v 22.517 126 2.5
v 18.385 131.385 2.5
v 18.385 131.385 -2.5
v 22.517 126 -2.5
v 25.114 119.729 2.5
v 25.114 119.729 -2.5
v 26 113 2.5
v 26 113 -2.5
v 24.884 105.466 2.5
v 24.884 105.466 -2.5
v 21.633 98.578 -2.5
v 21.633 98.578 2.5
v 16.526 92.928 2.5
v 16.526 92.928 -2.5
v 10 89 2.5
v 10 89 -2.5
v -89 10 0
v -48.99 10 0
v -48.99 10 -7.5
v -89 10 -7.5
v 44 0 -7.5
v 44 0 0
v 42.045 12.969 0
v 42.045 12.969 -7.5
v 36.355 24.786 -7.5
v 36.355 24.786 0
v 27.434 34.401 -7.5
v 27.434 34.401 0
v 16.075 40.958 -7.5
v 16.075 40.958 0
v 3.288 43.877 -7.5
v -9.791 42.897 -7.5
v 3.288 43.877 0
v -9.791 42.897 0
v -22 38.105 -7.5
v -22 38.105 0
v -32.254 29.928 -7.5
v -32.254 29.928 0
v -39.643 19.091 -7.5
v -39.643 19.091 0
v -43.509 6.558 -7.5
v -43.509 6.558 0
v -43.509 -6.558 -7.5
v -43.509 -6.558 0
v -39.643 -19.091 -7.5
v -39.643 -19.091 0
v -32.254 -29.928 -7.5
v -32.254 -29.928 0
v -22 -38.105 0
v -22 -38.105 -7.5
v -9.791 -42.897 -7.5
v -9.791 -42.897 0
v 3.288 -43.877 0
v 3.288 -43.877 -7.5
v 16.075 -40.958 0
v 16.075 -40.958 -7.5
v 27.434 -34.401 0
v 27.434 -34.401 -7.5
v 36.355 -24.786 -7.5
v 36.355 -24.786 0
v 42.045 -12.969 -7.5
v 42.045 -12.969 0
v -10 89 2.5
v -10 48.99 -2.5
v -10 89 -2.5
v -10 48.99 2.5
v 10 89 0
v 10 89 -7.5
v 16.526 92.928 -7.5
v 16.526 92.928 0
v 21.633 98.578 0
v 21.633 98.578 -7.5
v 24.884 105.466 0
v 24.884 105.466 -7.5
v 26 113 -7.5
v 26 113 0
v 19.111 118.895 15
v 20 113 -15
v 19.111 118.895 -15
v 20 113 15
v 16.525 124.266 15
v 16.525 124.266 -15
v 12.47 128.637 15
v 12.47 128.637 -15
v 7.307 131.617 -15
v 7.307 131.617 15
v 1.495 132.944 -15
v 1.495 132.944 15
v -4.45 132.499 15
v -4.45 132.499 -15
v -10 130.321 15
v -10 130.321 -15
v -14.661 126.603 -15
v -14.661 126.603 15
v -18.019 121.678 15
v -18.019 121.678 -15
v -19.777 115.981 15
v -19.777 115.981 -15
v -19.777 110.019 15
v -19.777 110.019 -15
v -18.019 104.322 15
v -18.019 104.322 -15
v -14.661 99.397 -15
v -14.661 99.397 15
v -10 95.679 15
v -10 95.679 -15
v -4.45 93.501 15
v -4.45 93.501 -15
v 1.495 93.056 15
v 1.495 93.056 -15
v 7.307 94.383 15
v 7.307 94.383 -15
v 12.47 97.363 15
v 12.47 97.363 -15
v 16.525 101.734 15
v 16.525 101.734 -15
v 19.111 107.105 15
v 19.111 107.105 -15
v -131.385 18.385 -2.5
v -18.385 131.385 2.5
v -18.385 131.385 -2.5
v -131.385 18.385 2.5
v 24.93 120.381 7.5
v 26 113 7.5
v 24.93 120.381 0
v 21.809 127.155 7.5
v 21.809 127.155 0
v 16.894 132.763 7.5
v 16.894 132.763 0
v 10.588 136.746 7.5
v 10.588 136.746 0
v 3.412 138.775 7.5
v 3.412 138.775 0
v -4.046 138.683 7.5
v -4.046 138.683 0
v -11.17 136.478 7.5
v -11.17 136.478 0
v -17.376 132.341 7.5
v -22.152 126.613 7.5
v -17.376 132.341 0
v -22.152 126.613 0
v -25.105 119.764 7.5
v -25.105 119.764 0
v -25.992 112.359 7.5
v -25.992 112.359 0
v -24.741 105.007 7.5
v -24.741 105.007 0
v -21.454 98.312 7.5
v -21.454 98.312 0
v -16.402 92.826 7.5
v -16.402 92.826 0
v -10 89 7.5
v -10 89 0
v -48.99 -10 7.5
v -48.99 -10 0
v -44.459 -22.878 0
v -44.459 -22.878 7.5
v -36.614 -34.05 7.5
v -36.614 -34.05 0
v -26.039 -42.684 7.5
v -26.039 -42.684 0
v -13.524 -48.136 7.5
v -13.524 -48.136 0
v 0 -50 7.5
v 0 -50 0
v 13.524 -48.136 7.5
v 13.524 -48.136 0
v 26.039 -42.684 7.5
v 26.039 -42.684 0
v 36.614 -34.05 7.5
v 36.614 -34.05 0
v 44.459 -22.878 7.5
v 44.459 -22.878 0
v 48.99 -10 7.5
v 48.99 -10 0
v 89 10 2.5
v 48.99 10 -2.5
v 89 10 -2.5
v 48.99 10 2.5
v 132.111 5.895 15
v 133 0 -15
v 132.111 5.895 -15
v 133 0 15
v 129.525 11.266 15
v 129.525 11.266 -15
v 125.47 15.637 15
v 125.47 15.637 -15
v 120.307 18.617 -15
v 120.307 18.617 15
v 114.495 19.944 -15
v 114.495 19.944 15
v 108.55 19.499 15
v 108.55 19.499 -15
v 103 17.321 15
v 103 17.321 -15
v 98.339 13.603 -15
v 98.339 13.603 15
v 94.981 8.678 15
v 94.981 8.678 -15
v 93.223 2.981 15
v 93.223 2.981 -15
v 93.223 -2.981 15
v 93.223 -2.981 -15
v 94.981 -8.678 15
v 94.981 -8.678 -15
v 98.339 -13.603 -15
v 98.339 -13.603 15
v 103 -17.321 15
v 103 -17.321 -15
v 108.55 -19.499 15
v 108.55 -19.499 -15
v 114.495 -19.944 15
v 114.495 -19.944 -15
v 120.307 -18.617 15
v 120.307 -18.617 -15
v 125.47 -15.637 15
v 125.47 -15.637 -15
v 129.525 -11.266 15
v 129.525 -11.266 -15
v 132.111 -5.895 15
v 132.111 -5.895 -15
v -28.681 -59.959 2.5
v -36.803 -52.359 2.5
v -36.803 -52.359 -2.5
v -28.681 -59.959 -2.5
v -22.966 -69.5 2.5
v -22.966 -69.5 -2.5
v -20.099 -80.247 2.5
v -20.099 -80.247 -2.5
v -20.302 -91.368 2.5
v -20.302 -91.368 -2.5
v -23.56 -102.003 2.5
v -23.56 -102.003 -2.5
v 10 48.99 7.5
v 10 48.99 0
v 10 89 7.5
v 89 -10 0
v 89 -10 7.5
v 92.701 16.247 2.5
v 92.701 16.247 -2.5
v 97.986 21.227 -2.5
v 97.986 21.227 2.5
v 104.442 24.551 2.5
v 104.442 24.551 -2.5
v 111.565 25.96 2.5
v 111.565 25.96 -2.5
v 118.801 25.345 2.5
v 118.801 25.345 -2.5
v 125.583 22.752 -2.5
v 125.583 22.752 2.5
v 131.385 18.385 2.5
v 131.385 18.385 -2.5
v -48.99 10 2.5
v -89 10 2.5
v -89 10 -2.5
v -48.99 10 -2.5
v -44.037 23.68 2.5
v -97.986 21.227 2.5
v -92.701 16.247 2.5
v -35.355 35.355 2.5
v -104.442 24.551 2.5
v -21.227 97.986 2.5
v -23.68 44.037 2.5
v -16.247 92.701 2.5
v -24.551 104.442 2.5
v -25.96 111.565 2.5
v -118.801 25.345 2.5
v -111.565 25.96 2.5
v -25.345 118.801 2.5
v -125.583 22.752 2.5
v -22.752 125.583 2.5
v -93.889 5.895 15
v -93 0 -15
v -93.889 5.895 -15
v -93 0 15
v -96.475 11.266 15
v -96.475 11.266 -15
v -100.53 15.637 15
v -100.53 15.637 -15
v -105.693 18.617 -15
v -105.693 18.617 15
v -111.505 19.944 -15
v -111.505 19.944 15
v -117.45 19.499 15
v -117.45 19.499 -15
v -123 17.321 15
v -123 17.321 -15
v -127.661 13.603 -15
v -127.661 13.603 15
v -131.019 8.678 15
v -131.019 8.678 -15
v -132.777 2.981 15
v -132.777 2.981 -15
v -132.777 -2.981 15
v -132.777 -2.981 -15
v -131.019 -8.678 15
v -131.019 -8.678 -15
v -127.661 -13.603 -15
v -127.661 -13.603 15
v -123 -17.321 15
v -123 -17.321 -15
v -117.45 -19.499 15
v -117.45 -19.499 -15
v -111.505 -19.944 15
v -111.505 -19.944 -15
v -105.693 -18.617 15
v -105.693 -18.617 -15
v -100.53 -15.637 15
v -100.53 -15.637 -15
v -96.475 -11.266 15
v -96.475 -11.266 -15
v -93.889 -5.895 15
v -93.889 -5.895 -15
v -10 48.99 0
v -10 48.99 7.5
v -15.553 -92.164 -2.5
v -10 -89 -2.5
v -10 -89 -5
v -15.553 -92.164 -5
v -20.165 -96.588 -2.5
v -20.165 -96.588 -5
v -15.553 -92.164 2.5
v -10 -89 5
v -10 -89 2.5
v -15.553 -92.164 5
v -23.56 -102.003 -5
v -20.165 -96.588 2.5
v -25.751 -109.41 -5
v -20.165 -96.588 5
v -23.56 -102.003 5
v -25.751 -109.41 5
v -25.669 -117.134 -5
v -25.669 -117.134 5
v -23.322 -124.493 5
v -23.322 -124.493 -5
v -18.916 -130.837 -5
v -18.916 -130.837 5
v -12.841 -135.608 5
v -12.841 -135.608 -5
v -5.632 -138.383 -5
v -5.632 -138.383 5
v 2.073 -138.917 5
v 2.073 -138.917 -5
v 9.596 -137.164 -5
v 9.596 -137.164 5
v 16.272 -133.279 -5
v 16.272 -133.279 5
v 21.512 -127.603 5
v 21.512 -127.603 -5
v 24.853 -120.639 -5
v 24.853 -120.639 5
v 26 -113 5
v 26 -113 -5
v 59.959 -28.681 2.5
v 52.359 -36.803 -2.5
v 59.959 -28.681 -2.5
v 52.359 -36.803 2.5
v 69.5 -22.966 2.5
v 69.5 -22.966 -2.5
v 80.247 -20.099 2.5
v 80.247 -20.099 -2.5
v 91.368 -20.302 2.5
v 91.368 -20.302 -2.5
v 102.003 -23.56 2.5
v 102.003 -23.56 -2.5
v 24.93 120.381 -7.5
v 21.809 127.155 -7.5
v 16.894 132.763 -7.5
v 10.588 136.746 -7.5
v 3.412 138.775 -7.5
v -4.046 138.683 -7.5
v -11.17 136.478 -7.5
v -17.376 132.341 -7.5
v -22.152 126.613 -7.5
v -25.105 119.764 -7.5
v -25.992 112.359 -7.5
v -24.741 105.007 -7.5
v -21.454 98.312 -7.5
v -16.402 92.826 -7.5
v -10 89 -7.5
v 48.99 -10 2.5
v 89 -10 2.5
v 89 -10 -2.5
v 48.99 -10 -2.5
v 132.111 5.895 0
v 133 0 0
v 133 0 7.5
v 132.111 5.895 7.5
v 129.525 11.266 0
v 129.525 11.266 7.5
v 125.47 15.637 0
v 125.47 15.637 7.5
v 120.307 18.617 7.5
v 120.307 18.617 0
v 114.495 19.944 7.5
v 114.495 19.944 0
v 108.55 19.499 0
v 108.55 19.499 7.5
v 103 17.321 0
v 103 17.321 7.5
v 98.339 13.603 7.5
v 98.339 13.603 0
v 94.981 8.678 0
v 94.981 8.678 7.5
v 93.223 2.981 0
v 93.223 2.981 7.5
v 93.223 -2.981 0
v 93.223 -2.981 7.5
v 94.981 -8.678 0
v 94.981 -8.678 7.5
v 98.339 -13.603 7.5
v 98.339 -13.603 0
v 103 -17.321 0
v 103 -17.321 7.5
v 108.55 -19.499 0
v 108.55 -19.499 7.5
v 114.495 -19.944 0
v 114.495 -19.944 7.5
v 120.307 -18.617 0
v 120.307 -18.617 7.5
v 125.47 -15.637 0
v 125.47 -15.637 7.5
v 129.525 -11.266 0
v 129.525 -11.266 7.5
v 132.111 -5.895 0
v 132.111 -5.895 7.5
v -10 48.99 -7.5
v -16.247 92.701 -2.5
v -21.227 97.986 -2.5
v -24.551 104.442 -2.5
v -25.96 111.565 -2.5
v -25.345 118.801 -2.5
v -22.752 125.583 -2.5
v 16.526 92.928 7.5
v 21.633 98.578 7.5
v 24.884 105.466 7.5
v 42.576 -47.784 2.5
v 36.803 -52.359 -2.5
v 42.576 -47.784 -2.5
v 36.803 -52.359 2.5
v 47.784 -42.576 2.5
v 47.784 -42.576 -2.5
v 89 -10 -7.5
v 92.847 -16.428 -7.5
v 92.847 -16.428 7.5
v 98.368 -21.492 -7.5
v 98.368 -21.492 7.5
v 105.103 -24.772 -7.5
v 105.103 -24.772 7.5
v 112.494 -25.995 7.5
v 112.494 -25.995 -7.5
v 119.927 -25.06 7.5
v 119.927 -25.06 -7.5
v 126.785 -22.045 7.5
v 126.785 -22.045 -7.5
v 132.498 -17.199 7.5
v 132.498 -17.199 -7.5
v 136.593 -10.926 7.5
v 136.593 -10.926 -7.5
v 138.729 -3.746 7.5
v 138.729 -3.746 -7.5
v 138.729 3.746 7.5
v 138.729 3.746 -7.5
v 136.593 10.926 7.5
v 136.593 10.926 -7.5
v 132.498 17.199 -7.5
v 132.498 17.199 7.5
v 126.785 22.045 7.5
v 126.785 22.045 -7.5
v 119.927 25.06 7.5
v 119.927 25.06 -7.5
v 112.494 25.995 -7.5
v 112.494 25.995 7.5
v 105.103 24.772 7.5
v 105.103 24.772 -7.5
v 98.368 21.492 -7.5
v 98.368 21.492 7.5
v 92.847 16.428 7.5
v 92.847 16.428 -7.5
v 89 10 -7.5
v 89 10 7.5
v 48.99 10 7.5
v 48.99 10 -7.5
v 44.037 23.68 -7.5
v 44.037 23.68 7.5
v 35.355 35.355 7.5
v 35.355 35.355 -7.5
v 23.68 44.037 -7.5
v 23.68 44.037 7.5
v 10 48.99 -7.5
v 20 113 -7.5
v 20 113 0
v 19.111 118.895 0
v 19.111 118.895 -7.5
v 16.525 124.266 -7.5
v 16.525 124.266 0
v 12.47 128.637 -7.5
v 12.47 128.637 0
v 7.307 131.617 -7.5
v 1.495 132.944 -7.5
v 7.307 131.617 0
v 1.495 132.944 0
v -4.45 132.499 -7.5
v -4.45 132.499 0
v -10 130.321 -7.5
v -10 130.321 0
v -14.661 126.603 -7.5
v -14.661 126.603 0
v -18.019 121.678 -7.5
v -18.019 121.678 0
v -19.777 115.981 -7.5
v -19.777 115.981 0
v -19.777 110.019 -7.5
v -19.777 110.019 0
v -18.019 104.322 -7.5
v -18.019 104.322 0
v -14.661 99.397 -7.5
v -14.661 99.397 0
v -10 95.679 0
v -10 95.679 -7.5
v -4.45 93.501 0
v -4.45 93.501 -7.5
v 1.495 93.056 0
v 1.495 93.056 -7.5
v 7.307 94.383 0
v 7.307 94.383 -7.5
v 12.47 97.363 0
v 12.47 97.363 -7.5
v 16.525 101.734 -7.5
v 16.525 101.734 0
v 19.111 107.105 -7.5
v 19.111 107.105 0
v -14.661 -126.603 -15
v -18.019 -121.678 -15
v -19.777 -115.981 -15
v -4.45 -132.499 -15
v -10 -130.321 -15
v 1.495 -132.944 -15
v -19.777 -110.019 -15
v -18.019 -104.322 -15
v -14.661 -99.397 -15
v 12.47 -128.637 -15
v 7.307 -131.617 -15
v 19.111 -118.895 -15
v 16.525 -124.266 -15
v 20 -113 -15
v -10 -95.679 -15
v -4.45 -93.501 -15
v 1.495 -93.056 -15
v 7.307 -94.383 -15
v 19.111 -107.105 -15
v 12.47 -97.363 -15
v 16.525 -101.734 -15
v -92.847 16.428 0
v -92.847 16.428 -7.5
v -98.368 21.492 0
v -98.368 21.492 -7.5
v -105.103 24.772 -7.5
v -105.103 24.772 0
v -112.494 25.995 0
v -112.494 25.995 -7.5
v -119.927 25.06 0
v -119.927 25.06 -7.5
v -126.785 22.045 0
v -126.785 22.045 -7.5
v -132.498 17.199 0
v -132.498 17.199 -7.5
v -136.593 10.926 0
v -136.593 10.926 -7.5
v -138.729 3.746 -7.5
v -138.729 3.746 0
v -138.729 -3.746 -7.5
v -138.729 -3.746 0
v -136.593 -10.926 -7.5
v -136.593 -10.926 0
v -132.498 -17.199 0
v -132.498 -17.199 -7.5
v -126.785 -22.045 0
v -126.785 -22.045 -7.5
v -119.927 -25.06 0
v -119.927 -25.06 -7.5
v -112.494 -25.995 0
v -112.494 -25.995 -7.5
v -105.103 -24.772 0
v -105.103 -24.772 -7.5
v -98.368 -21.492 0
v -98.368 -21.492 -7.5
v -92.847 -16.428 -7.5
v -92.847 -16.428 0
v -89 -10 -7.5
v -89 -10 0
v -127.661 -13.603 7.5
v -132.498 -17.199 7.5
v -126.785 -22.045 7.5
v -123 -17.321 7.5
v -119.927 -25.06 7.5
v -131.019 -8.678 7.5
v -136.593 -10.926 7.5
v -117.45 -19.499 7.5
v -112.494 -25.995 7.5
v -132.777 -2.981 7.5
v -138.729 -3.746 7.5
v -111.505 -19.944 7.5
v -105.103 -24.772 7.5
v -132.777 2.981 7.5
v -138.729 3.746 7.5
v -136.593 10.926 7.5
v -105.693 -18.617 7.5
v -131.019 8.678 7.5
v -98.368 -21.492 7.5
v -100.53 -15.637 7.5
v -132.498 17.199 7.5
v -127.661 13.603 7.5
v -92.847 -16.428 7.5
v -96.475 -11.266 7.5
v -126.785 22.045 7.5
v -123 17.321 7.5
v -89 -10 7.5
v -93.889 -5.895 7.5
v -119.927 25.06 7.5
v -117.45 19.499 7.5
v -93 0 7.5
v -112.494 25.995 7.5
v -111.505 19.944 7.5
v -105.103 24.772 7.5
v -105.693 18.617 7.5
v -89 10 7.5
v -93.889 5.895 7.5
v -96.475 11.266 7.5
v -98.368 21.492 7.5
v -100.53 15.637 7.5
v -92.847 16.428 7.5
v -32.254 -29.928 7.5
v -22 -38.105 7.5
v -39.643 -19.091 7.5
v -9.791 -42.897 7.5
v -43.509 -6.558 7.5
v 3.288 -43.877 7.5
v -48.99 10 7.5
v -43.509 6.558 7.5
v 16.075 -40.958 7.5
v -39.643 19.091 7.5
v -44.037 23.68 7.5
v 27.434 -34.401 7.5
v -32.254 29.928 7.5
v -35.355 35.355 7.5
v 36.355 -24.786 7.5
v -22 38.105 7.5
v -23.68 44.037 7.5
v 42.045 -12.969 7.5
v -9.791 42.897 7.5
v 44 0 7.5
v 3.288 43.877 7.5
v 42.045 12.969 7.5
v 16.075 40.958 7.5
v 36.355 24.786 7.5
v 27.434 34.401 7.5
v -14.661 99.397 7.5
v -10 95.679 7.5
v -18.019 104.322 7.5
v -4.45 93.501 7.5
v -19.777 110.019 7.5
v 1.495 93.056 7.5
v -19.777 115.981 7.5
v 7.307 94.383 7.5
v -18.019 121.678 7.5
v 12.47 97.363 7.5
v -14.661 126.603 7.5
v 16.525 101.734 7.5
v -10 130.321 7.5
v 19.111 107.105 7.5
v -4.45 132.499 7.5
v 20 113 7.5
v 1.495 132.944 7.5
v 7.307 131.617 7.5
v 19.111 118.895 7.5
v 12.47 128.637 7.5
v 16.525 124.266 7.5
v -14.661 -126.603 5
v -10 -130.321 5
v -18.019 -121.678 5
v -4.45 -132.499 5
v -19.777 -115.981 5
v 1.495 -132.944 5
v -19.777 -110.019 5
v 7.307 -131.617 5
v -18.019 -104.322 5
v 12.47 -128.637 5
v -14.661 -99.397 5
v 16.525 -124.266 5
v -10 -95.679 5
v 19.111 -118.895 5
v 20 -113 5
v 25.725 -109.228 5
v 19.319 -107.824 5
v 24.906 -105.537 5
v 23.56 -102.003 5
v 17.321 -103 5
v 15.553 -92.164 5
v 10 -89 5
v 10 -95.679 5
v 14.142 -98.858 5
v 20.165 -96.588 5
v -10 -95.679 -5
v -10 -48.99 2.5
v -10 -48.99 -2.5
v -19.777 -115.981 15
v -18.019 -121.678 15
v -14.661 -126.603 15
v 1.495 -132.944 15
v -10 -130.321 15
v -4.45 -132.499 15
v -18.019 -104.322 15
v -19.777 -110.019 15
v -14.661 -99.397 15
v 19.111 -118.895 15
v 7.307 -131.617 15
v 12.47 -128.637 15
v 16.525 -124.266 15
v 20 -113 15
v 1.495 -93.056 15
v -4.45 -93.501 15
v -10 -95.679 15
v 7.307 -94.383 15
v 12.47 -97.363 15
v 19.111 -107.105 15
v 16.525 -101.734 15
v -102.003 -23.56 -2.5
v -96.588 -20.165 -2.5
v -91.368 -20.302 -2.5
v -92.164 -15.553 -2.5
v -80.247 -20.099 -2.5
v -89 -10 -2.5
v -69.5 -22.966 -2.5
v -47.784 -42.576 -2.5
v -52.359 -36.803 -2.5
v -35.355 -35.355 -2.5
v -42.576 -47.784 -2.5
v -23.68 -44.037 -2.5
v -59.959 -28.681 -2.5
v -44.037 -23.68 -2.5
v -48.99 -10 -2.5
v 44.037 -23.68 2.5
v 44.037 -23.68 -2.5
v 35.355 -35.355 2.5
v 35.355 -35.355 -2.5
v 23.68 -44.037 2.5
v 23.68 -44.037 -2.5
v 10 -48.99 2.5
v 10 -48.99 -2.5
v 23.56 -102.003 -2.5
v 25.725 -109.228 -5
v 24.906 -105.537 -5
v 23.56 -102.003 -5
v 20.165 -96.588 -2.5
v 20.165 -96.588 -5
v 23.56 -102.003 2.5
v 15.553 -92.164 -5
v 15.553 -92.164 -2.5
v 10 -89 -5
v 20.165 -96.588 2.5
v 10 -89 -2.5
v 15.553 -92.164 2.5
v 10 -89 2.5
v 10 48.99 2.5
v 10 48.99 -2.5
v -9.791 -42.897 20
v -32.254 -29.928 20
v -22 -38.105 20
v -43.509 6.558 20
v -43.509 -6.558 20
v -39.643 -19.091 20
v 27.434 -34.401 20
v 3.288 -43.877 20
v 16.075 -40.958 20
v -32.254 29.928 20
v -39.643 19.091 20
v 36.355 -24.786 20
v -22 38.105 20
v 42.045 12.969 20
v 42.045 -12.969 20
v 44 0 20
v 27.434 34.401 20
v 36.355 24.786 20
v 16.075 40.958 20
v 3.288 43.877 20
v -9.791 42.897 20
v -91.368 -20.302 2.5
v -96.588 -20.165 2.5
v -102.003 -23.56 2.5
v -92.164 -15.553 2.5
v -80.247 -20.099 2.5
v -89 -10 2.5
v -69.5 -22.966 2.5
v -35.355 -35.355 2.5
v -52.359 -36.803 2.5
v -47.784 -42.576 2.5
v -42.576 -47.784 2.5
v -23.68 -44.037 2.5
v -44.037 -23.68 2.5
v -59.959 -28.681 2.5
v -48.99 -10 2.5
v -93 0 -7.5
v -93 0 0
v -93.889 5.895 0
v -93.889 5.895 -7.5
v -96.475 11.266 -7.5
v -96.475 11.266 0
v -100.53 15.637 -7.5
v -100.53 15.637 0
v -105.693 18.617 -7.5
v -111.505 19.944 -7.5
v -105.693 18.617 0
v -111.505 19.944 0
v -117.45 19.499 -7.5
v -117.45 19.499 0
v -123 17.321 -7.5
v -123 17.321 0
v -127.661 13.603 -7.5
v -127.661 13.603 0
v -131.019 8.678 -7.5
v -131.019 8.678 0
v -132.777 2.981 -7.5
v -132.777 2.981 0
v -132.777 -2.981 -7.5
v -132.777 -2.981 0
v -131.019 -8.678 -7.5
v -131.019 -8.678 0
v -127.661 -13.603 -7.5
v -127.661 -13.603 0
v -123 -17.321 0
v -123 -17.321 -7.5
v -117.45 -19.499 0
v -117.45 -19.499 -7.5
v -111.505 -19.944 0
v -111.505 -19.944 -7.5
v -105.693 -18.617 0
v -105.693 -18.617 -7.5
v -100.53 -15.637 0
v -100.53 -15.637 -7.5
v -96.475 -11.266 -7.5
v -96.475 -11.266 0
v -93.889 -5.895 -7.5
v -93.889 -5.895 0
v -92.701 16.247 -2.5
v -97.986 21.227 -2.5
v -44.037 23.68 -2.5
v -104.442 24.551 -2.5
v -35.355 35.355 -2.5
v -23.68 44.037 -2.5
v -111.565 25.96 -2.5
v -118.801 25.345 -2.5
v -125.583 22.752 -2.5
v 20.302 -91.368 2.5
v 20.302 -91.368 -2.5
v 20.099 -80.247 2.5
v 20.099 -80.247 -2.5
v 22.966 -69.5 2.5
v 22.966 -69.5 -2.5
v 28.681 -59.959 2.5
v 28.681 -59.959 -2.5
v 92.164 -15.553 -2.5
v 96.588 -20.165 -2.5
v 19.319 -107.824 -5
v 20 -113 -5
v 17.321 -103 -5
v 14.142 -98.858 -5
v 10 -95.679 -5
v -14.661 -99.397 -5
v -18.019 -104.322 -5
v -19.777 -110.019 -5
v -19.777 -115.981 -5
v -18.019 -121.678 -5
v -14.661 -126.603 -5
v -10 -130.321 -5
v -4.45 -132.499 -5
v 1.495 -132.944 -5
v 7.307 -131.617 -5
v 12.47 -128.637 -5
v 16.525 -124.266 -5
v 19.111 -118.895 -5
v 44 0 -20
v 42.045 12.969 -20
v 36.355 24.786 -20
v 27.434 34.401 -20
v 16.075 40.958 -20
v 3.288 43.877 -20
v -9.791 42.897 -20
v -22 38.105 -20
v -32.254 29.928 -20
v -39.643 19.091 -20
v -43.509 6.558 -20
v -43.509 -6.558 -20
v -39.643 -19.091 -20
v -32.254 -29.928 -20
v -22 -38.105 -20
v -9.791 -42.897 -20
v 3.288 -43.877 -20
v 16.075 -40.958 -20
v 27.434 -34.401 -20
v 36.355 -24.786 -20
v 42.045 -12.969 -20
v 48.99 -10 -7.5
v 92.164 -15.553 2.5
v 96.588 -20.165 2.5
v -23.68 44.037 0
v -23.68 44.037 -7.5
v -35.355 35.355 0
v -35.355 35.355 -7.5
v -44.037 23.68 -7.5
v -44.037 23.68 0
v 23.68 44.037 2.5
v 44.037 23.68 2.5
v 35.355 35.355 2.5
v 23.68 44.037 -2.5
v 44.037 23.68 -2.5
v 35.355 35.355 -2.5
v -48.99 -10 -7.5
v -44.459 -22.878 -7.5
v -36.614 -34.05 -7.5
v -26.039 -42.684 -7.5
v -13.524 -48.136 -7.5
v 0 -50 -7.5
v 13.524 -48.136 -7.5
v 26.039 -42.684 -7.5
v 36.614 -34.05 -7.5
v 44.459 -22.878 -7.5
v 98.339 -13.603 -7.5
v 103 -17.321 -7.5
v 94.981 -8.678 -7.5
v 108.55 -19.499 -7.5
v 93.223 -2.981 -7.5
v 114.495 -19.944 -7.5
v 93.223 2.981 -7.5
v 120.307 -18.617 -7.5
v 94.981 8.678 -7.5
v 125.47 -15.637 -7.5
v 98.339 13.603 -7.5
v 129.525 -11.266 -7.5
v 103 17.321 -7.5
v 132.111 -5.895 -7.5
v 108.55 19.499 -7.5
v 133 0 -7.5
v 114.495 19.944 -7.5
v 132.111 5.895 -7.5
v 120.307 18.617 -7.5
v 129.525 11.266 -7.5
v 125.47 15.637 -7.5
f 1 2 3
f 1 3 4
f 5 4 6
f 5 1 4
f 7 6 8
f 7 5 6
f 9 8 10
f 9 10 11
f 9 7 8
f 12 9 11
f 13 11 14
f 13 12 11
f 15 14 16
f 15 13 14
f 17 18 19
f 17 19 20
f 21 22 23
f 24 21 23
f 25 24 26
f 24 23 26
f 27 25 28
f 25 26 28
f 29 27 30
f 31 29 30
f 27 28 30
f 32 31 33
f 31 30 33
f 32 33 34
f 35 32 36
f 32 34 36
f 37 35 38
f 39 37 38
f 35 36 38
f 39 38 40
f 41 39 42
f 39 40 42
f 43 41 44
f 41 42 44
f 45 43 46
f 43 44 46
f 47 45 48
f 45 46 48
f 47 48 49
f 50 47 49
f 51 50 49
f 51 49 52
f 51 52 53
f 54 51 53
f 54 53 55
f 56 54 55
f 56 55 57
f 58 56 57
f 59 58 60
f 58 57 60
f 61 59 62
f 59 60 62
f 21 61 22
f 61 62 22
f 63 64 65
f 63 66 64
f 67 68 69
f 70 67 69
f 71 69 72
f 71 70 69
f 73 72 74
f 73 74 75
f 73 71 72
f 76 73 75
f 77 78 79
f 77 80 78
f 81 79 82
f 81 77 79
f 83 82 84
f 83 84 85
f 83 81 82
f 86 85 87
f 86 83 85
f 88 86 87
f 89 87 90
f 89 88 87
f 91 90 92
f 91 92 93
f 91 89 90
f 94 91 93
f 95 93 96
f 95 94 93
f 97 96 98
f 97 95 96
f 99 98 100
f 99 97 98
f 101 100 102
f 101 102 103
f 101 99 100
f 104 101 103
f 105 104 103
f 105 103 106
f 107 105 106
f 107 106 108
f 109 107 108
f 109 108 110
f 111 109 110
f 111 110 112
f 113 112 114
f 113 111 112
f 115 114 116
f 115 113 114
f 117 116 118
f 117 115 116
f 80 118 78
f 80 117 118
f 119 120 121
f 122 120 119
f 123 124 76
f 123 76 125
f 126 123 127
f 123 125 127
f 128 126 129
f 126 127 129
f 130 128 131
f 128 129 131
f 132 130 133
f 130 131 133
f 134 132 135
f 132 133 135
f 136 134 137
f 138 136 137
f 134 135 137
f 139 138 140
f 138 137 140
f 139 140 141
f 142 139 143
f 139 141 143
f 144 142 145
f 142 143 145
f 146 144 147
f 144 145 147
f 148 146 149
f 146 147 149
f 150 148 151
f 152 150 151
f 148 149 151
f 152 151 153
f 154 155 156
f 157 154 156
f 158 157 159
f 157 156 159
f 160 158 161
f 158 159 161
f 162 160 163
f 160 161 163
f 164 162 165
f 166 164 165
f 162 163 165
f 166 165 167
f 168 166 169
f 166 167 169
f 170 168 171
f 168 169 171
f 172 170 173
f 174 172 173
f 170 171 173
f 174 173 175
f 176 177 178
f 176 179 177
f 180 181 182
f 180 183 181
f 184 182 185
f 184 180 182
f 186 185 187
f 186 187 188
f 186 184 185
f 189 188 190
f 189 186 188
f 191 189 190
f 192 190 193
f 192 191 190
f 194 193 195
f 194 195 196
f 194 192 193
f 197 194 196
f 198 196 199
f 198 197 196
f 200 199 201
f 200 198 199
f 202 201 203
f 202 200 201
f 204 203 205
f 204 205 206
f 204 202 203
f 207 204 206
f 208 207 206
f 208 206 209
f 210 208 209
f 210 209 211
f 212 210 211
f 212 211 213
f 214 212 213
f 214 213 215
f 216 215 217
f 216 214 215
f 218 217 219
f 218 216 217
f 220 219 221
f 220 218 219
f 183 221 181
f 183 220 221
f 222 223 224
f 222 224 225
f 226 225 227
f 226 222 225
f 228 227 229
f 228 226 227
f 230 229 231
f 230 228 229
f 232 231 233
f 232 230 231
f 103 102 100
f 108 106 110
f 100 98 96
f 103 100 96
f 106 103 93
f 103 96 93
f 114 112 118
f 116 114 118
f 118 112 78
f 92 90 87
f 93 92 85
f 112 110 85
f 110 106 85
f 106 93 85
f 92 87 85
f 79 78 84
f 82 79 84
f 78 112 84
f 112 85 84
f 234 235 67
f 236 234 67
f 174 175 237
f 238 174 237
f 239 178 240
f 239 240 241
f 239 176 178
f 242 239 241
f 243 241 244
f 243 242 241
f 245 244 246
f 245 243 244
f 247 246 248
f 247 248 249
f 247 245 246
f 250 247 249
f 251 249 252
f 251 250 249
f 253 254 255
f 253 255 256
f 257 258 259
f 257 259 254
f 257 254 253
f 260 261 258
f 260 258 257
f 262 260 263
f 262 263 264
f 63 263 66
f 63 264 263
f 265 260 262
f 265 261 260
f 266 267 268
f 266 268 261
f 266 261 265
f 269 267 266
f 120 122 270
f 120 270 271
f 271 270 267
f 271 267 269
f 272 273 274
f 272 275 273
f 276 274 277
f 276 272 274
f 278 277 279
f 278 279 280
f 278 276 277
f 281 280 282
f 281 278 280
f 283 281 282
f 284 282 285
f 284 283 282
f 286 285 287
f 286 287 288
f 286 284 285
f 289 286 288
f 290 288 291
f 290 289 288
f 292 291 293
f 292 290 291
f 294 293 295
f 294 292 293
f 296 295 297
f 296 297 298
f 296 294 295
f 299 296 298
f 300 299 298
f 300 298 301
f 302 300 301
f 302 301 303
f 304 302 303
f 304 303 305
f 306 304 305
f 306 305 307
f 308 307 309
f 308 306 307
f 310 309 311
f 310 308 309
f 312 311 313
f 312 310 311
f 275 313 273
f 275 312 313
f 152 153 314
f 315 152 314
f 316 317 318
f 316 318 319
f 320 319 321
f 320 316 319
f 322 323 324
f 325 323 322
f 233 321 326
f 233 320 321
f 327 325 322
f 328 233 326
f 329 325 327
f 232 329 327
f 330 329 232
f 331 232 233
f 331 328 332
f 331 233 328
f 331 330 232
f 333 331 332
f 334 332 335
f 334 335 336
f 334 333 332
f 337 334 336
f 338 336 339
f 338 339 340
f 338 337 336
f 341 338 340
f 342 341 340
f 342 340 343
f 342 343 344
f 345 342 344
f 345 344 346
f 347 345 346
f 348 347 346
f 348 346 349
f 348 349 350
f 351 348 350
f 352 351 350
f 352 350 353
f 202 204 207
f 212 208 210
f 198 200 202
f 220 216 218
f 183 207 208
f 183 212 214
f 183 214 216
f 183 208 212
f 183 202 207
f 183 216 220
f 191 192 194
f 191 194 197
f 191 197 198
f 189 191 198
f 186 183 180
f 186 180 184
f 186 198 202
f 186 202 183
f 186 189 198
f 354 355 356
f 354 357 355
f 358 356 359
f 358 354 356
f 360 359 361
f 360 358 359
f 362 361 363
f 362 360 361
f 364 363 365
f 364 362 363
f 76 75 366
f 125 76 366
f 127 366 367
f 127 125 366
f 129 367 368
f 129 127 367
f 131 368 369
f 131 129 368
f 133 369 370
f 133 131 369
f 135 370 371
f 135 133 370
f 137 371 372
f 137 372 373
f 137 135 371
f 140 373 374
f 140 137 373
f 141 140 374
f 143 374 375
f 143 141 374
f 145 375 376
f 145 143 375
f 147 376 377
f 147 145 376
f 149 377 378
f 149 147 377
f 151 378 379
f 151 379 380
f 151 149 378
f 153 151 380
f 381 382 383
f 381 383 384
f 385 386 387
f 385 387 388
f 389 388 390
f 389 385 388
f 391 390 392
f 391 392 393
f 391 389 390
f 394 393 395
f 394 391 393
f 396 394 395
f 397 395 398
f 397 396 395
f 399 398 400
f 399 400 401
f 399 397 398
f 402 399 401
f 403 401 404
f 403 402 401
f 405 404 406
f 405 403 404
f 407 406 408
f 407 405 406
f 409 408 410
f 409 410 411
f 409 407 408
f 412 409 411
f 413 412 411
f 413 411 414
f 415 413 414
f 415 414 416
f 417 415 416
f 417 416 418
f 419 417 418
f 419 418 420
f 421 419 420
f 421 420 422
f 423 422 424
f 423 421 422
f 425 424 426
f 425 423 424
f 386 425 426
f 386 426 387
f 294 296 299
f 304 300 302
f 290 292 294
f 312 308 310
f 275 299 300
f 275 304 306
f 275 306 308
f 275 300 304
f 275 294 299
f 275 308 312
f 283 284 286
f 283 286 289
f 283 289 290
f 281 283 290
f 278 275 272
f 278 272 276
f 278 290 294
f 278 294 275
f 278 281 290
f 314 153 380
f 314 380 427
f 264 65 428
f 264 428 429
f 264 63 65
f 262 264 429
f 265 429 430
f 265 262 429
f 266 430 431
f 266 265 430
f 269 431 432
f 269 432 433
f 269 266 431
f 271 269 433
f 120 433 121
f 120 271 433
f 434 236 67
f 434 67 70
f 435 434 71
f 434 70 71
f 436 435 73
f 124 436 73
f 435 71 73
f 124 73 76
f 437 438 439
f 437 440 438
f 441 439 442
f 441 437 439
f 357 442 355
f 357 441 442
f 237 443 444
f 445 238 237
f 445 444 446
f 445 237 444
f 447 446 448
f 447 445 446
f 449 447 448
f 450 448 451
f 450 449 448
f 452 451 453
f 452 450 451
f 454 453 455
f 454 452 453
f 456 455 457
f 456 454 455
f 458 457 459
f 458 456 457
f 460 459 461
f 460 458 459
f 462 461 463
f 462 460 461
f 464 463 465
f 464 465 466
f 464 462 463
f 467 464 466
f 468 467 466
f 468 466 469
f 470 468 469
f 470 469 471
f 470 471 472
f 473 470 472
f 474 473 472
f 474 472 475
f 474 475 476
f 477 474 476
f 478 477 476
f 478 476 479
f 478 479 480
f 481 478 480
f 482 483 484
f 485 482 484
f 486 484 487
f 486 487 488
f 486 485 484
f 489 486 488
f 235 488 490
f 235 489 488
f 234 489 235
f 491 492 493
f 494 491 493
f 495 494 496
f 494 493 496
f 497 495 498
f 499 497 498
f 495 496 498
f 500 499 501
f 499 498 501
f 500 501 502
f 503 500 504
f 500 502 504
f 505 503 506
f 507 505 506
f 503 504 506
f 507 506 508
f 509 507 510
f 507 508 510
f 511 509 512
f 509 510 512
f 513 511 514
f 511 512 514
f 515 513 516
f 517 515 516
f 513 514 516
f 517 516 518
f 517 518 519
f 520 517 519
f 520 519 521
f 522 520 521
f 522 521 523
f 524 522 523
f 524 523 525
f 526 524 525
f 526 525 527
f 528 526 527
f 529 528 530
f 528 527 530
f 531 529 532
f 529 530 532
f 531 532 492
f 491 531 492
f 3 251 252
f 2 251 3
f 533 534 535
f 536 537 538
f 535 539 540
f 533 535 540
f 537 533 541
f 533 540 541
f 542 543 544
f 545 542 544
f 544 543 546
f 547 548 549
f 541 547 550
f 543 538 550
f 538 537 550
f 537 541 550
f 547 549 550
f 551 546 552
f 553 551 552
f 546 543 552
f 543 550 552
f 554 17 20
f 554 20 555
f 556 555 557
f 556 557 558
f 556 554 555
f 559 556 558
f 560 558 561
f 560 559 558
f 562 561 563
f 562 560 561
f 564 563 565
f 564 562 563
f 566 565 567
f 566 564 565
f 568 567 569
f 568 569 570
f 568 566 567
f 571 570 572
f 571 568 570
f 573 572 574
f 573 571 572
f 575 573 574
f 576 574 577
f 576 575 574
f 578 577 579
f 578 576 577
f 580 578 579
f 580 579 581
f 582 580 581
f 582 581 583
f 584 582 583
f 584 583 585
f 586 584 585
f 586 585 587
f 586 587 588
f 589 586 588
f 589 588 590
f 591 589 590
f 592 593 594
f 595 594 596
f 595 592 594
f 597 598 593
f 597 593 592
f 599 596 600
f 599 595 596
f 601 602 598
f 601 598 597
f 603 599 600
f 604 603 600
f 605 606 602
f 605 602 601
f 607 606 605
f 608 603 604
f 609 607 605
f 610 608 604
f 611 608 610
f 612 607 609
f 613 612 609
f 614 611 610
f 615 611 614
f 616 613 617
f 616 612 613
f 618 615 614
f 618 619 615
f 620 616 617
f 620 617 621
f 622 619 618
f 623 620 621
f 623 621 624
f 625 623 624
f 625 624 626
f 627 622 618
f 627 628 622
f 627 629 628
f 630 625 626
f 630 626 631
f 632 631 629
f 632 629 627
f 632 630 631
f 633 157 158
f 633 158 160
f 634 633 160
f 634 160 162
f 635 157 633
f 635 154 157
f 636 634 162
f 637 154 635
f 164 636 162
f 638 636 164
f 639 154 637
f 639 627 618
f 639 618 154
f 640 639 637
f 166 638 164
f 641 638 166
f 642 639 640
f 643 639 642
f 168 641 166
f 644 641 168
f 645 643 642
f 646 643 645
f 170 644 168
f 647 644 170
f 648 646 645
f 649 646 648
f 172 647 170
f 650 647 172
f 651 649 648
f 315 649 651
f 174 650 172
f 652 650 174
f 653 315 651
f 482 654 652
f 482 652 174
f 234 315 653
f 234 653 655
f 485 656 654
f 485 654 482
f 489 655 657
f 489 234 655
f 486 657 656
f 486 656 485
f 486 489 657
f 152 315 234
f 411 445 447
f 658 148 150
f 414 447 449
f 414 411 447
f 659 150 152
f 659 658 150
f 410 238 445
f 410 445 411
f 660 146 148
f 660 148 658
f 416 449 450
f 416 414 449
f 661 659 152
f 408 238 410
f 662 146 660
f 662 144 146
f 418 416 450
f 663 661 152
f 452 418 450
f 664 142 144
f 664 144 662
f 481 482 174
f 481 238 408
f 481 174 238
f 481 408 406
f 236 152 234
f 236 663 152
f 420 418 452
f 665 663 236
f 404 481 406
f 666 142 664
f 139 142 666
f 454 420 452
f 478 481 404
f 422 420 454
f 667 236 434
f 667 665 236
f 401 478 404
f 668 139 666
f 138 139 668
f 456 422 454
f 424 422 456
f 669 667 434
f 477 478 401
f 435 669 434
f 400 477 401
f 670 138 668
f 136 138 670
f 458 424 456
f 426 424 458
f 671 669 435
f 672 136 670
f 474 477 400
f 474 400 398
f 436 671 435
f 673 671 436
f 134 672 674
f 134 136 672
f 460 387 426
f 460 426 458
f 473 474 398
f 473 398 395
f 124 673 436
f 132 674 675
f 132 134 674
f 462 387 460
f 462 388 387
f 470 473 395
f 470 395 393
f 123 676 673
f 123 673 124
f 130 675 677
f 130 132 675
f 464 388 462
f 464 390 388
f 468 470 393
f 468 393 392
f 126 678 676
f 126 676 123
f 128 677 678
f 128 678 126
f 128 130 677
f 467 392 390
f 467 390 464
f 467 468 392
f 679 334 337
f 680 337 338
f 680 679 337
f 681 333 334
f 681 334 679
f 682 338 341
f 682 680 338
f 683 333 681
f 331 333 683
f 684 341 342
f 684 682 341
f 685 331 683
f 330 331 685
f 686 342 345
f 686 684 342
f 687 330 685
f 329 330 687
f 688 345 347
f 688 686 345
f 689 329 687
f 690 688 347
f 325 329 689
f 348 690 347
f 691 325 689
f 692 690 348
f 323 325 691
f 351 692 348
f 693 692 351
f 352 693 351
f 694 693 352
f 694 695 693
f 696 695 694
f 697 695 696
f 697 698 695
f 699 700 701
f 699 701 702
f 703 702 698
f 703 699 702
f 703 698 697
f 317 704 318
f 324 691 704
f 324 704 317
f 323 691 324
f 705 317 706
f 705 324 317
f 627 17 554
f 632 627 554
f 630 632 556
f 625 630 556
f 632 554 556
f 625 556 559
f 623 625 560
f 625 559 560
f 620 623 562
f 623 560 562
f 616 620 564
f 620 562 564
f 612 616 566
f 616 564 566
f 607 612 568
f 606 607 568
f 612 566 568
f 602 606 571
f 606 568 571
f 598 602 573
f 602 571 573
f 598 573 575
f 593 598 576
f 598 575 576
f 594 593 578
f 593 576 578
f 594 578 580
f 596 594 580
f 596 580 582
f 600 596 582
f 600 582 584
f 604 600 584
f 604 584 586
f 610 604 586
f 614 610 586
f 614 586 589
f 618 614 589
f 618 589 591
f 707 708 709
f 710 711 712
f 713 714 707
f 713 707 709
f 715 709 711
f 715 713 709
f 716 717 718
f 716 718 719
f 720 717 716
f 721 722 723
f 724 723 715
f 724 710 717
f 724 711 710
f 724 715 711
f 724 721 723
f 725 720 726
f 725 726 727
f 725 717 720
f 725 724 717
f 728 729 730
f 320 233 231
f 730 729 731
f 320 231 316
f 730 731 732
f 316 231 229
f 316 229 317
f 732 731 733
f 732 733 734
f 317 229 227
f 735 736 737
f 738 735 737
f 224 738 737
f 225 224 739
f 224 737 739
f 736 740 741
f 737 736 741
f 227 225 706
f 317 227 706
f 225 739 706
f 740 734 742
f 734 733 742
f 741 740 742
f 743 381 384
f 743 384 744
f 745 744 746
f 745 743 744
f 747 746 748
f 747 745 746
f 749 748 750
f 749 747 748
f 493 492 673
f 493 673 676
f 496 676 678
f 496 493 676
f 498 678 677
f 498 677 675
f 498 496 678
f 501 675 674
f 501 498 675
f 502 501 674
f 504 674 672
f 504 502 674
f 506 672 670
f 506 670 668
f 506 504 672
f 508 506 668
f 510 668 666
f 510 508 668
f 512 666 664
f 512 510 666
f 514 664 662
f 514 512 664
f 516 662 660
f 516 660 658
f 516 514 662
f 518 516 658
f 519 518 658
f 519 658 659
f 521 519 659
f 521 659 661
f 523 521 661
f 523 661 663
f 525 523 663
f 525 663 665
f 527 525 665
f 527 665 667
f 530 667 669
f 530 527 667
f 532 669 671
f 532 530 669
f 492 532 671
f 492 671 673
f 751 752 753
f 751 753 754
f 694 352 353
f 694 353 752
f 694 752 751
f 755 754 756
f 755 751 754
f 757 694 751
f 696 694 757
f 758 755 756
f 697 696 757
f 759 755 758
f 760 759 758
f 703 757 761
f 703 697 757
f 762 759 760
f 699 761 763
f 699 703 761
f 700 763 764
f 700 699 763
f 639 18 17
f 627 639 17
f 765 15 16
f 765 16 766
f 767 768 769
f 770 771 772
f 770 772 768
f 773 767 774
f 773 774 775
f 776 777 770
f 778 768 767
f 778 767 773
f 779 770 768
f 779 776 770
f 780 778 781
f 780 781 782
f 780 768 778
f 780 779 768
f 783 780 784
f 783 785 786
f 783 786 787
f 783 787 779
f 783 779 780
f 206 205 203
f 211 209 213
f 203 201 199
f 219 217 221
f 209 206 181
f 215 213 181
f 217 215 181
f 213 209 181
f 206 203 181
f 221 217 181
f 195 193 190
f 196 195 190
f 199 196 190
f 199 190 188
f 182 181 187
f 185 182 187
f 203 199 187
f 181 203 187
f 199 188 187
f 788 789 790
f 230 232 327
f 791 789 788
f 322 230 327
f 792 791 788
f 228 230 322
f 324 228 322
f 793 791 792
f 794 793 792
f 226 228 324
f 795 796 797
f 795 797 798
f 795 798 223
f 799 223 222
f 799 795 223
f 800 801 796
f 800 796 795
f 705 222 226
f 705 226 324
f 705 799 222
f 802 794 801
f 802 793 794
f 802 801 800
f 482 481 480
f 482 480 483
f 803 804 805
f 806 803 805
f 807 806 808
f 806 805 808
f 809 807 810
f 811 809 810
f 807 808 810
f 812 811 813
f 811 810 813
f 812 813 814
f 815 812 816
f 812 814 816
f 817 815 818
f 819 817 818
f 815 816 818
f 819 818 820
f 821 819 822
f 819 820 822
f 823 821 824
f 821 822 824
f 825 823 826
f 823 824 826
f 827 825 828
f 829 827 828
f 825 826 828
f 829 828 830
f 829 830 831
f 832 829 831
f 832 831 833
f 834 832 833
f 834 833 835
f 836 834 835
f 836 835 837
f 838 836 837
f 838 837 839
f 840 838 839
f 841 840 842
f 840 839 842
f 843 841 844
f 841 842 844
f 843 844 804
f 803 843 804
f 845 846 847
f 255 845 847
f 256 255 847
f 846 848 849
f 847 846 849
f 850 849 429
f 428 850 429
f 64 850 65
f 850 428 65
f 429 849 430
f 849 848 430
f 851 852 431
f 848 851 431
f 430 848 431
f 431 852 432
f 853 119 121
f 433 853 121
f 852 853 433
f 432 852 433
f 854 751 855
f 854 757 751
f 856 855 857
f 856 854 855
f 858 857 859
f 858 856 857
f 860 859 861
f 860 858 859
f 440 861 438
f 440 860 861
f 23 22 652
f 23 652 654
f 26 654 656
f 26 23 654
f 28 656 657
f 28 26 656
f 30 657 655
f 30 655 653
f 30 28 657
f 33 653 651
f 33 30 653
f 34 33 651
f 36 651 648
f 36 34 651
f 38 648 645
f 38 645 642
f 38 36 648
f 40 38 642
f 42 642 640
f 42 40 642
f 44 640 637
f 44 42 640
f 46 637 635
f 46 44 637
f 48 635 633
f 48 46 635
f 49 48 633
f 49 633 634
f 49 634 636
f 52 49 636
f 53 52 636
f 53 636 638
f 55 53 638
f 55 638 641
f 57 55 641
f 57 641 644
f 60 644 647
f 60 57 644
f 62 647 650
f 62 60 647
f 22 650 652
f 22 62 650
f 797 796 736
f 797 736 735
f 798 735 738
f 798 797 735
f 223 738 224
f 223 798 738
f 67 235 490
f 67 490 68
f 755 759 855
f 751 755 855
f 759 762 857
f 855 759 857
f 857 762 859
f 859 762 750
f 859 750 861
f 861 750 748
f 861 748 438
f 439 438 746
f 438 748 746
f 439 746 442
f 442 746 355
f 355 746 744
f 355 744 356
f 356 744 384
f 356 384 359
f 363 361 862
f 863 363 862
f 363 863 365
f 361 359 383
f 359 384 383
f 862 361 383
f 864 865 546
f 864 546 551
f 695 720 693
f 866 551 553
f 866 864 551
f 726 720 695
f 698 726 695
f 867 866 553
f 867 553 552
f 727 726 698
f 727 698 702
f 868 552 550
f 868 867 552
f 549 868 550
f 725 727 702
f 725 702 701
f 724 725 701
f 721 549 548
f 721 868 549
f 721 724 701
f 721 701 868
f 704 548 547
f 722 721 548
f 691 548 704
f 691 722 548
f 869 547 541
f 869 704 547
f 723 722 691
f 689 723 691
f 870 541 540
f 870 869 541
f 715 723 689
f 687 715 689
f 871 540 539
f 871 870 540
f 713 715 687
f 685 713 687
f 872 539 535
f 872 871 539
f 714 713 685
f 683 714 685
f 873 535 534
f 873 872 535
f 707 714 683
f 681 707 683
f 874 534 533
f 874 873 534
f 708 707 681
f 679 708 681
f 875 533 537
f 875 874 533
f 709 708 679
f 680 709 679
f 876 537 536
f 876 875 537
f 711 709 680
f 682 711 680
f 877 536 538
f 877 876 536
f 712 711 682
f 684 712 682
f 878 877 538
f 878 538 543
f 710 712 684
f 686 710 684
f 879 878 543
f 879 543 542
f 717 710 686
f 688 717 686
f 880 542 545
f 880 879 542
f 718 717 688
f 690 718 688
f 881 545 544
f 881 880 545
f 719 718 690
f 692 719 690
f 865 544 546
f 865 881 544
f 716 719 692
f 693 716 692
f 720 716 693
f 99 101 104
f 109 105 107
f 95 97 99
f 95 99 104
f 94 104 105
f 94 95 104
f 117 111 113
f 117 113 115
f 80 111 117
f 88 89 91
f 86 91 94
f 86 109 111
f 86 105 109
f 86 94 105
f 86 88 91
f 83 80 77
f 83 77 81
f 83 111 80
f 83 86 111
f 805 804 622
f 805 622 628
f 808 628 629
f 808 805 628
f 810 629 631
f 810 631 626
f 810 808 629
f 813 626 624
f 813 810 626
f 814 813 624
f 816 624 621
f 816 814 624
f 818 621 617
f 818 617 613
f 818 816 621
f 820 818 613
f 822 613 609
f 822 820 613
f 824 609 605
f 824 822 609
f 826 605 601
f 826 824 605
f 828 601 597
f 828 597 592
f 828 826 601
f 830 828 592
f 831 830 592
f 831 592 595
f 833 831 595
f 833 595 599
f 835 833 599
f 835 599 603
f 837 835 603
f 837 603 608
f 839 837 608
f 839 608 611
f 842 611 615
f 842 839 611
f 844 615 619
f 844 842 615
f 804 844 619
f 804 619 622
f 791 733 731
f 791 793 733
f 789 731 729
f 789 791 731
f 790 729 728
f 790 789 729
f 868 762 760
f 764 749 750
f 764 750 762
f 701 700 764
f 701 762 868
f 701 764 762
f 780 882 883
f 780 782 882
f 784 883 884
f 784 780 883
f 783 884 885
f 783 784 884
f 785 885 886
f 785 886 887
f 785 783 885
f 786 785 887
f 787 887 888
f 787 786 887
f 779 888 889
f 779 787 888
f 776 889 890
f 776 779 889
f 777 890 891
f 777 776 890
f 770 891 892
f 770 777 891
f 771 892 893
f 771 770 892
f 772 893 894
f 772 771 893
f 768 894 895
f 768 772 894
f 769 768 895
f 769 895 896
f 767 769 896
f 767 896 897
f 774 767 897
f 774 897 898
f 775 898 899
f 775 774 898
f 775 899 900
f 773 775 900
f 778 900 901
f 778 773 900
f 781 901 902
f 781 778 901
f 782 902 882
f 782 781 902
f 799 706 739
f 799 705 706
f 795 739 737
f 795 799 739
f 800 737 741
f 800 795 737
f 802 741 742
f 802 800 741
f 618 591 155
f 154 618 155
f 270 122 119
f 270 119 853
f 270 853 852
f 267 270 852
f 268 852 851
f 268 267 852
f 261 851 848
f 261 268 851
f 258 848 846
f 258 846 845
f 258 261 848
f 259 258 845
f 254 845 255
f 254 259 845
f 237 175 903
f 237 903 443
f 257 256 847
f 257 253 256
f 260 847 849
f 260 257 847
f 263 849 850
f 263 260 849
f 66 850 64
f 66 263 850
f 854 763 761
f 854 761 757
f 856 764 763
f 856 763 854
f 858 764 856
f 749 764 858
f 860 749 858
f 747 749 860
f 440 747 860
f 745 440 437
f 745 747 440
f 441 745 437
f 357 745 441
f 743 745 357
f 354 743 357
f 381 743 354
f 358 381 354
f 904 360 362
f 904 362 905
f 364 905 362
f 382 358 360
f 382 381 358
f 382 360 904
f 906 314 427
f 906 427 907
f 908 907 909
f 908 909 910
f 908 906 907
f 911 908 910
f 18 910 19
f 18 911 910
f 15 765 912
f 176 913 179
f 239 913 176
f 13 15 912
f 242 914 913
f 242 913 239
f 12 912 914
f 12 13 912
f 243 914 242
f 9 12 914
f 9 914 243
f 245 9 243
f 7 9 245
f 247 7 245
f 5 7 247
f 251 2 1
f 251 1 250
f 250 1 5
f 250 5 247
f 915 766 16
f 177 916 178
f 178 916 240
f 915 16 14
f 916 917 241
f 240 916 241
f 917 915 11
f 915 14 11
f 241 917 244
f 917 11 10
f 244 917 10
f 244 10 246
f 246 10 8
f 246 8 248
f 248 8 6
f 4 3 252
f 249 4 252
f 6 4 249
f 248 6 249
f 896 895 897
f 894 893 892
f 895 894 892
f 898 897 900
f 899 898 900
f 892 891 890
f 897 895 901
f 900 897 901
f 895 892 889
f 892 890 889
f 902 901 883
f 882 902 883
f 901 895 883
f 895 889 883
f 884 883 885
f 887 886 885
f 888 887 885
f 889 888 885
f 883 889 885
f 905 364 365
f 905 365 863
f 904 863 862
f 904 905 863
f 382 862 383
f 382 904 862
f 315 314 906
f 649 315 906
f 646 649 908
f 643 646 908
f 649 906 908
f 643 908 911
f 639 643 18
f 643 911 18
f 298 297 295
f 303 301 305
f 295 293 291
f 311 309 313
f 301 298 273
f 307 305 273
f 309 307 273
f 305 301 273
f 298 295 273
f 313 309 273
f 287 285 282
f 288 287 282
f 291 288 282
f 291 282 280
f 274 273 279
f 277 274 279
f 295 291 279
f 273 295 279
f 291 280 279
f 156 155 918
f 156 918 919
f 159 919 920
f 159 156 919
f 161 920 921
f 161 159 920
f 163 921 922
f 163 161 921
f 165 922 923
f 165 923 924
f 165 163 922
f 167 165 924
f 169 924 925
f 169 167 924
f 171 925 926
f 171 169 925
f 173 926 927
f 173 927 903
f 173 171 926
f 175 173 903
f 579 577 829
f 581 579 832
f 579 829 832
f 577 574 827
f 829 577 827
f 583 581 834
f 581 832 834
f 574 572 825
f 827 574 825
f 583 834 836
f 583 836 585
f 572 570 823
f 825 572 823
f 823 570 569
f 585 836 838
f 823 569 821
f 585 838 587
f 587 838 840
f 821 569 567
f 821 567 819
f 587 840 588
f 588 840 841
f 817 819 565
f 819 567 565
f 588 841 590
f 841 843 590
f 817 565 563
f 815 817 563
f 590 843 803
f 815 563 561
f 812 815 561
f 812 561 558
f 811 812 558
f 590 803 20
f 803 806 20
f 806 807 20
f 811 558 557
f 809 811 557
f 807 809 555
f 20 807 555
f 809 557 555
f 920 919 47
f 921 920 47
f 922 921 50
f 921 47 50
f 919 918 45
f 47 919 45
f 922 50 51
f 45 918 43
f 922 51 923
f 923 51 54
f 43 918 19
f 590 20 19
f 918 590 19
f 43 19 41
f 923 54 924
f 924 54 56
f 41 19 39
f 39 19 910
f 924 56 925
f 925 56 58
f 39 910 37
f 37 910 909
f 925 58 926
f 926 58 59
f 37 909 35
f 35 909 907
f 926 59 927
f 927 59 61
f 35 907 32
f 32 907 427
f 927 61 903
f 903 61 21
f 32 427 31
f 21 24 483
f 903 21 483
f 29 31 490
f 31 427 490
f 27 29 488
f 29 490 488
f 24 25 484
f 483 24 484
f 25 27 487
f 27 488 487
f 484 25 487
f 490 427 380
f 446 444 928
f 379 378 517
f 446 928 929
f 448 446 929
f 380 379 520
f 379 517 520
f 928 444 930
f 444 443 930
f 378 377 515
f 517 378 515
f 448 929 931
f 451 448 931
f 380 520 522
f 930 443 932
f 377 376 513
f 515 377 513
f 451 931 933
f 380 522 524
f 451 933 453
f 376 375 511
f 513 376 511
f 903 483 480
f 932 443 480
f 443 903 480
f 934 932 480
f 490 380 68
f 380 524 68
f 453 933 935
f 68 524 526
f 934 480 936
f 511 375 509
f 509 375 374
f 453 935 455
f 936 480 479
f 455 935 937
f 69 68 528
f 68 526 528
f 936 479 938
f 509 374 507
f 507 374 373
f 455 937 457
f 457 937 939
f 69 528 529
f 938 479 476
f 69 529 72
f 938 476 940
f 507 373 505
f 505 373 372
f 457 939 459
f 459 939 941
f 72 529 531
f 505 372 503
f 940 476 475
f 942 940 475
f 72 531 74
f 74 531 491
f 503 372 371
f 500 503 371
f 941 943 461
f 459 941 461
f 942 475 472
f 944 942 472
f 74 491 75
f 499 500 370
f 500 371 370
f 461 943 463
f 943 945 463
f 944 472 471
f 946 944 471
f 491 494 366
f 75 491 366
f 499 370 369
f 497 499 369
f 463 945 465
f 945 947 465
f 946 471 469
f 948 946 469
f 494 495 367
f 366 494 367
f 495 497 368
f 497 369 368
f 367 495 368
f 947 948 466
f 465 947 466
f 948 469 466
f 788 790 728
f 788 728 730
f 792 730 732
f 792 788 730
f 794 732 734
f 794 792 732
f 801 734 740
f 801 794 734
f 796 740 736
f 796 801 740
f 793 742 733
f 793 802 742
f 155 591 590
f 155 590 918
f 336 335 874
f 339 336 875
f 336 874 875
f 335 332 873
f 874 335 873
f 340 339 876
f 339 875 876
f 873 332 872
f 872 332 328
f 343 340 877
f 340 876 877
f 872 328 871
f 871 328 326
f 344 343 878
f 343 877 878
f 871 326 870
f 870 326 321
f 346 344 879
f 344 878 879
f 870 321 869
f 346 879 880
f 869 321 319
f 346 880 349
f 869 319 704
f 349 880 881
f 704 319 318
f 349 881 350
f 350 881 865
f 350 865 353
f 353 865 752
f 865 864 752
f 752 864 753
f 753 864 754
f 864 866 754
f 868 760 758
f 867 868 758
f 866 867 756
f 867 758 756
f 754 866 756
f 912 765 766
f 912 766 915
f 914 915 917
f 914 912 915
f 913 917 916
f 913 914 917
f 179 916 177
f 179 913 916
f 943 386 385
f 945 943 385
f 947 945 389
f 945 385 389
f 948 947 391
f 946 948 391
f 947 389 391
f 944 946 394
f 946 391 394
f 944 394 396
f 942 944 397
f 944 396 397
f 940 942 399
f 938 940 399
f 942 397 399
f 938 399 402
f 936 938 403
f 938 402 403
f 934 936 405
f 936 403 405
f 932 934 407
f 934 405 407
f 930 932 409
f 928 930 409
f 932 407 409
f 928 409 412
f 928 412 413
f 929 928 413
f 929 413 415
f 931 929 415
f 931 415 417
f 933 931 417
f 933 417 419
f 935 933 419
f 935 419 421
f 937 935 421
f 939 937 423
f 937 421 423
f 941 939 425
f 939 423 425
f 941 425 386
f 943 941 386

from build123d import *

# Parameters (mm, degrees)
SKETCH1_R             = 20
BOSS_EXTRUDE1_DEPTH   = 15
BOSS_EXTRUDE1_2_DEPTH = 15
BOSS_EXTRUDE1_3_DEPTH = 15
BOSS_EXTRUDE1_4_DEPTH = 15
SKETCH1_3_R           = 44
BOSS_EXTRUDE2_DEPTH   = 20
BOSS_EXTRUDE3_DEPTH   = 2.5
BOSS_EXTRUDE3_2_DEPTH = 2.5
BOSS_EXTRUDE3_3_DEPTH = 2.5
BOSS_EXTRUDE3_4_DEPTH = 2.5
BOSS_EXTRUDE5_DEPTH   = 5
SKETCH1_7_R           = 20
SKETCH1_7_R_2         = 44
BOSS_EXTRUDE6_DEPTH   = 7.5


with BuildPart() as part:
    # Sketch1 → Boss-Extrude1 (new, symmetric)
    with BuildSketch(Plane.XY):
        with Locations((0, -113)):
            Circle(SKETCH1_R)
    extrude(amount=BOSS_EXTRUDE1_DEPTH, both=True)



with BuildPart() as body_2:
    # Sketch1 → Boss-Extrude1 2 (new, symmetric)
    with BuildSketch(Plane.XY):
        with Locations((113, 0)):
            Circle(SKETCH1_R)
    extrude(amount=BOSS_EXTRUDE1_2_DEPTH, both=True)


with BuildPart() as body_3:
    # Sketch1 → Boss-Extrude1 3 (new, symmetric)
    with BuildSketch(Plane.XY):
        with Locations((0, 113)):
            Circle(SKETCH1_R)
    extrude(amount=BOSS_EXTRUDE1_3_DEPTH, both=True)


with BuildPart() as body_4:
    # Sketch1 → Boss-Extrude1 4 (new, symmetric)
    with BuildSketch(Plane.XY):
        with Locations((-113, 0)):
            Circle(SKETCH1_R)
    extrude(amount=BOSS_EXTRUDE1_4_DEPTH, both=True)


with BuildPart() as body_5:
    # Sketch1<3> → Boss-Extrude2 (new, symmetric)
    with BuildSketch(Plane.XY):
        Circle(SKETCH1_3_R)
    extrude(amount=BOSS_EXTRUDE2_DEPTH, both=True)


with BuildPart() as body_6:
    # Sketch1<4> → Boss-Extrude3 (new, symmetric)
    with BuildSketch(Plane.XY):
        with BuildLine():
            Line((131.384776311, 18.384776311), (18.384776311, 131.384776311))
            ThreePointArc((18.384776311, 131.384776311), (25.505709112, 107.954328319), (10, 89))
            Line((10, 89), (10, 48.989794856))
            ThreePointArc((10, 48.989794856), (35.355339059, 35.355339059), (48.989794856, 10))
            Line((48.989794856, 10), (89, 10))
            ThreePointArc((89, 10), (107.954328319, 25.505709112), (131.384776311, 18.384776311))
        make_face()
    extrude(amount=BOSS_EXTRUDE3_DEPTH, both=True)


with BuildPart() as body_7:
    # Sketch1<4> → Boss-Extrude3 2 (new, symmetric)
    with BuildSketch(Plane.XY):
        with BuildLine():
            ThreePointArc((-10, 89), (-25.505709112, 107.954328319), (-18.384776311, 131.384776311))
            Line((-18.384776311, 131.384776311), (-131.384776311, 18.384776311))
            ThreePointArc((-131.384776311, 18.384776311), (-107.954328319, 25.505709112), (-89, 10))
            Line((-89, 10), (-48.989794856, 10))
            ThreePointArc((-48.989794856, 10), (-35.355339059, 35.355339059), (-10, 48.989794856))
            Line((-10, 48.989794856), (-10, 89))
        make_face()
    extrude(amount=BOSS_EXTRUDE3_2_DEPTH, both=True)


with BuildPart() as body_8:
    # Sketch1<4> → Boss-Extrude3 3 (new, symmetric)
    with BuildSketch(Plane.XY):
        with BuildLine():
            ThreePointArc((52.359428182, -36.803400392), (74.773631801, -21.15717706), (102.002815768, -23.559752524))
            ThreePointArc((102.002815768, -23.559752524), (94.233874983, -17.995348061), (89, -10))
            Line((89, -10), (48.989794856, -10))
            ThreePointArc((48.989794856, -10), (35.355339059, -35.355339059), (10, -48.989794856))
            Line((10, -48.989794856), (10, -89))
            ThreePointArc((10, -89), (17.995348061, -94.233874983), (23.559752524, -102.002815768))
            ThreePointArc((23.559752524, -102.002815768), (21.15717706, -74.773631801), (36.803400392, -52.359428182))
            ThreePointArc((36.803400392, -52.359428182), (45.254833996, -45.254833996), (52.359428182, -36.803400392))
        make_face()
    extrude(amount=BOSS_EXTRUDE3_3_DEPTH, both=True)


with BuildPart() as body_9:
    # Sketch1<4> → Boss-Extrude3 4 (new, symmetric)
    with BuildSketch(Plane.XY):
        with BuildLine():
            ThreePointArc((-89, -10), (-94.233874983, -17.995348061), (-102.002815768, -23.559752524))
            ThreePointArc((-102.002815768, -23.559752524), (-74.773631801, -21.15717706), (-52.359428182, -36.803400392))
            ThreePointArc((-52.359428182, -36.803400392), (-45.254833996, -45.254833996), (-36.803400392, -52.359428182))
            ThreePointArc((-36.803400392, -52.359428182), (-21.15717706, -74.773631801), (-23.559752524, -102.002815768))
            ThreePointArc((-23.559752524, -102.002815768), (-17.995348061, -94.233874983), (-10, -89))
            Line((-10, -89), (-10, -48.989794856))
            ThreePointArc((-10, -48.989794856), (-35.355339059, -35.355339059), (-48.989794856, -10))
            Line((-48.989794856, -10), (-89, -10))
        make_face()
    extrude(amount=BOSS_EXTRUDE3_4_DEPTH, both=True)


with BuildPart() as part_1:
    add(part.part)

    add(body_8.part)  # Boss-Extrude5 merges body 8

    add(body_9.part)  # Boss-Extrude5 merges body 9
    # Sketch1<6> → Boss-Extrude5 (add, symmetric)
    with BuildSketch(Plane.XY):
        with BuildLine():
            ThreePointArc((26, -113), (25.38260788, -107.367663256), (23.559752524, -102.002815768))
            ThreePointArc((23.559752524, -102.002815768), (17.995348061, -94.233874983), (10, -89))
            Line((10, -89), (10, -95.679491924))
            ThreePointArc((10, -95.679491924), (17.320508076, -103), (20, -113))
            ThreePointArc((20, -113), (-10, -130.320508076), (-10, -95.679491924))
            Line((-10, -95.679491924), (-10, -89))
            ThreePointArc((-10, -89), (-17.995348061, -94.233874983), (-23.559752524, -102.002815768))
            ThreePointArc((-23.559752524, -102.002815768), (-5.632336744, -138.38260788), (26, -113))
        make_face()
    extrude(amount=BOSS_EXTRUDE5_DEPTH, both=True)


with BuildPart() as body_8_2:
    # Sketch1<7> → Boss-Extrude6 (new, symmetric)
    with BuildSketch(Plane.XY):
        with BuildLine():
            Line((-10, 89), (-10, 48.989794856))
            ThreePointArc((-10, 48.989794856), (-35.355339059, 35.355339059), (-48.989794856, 10))
            Line((-48.989794856, 10), (-89, 10))
            ThreePointArc((-89, 10), (-139, 0), (-89, -10))
            Line((-89, -10), (-48.989794856, -10))
            ThreePointArc((-48.989794856, -10), (0, -50), (48.989794856, -10))
            Line((48.989794856, -10), (89, -10))
            ThreePointArc((89, -10), (139, 0), (89, 10))
            Line((89, 10), (48.989794856, 10))
            ThreePointArc((48.989794856, 10), (35.355339059, 35.355339059), (10, 48.989794856))
            Line((10, 48.989794856), (10, 89))
            ThreePointArc((10, 89), (0, 139), (-10, 89))
        make_face()
        with Locations((0, 113)):
            Circle(SKETCH1_7_R, mode=Mode.SUBTRACT)
        Circle(SKETCH1_7_R_2, mode=Mode.SUBTRACT)
        with Locations((113, 0)):
            Circle(SKETCH1_7_R, mode=Mode.SUBTRACT)
        with Locations((-113, 0)):
            Circle(SKETCH1_7_R, mode=Mode.SUBTRACT)
    extrude(amount=BOSS_EXTRUDE6_DEPTH, both=True)


solid = Compound([body_2.part, body_3.part, body_4.part, body_5.part, body_6.part, body_7.part, part_1.part, body_8_2.part])
